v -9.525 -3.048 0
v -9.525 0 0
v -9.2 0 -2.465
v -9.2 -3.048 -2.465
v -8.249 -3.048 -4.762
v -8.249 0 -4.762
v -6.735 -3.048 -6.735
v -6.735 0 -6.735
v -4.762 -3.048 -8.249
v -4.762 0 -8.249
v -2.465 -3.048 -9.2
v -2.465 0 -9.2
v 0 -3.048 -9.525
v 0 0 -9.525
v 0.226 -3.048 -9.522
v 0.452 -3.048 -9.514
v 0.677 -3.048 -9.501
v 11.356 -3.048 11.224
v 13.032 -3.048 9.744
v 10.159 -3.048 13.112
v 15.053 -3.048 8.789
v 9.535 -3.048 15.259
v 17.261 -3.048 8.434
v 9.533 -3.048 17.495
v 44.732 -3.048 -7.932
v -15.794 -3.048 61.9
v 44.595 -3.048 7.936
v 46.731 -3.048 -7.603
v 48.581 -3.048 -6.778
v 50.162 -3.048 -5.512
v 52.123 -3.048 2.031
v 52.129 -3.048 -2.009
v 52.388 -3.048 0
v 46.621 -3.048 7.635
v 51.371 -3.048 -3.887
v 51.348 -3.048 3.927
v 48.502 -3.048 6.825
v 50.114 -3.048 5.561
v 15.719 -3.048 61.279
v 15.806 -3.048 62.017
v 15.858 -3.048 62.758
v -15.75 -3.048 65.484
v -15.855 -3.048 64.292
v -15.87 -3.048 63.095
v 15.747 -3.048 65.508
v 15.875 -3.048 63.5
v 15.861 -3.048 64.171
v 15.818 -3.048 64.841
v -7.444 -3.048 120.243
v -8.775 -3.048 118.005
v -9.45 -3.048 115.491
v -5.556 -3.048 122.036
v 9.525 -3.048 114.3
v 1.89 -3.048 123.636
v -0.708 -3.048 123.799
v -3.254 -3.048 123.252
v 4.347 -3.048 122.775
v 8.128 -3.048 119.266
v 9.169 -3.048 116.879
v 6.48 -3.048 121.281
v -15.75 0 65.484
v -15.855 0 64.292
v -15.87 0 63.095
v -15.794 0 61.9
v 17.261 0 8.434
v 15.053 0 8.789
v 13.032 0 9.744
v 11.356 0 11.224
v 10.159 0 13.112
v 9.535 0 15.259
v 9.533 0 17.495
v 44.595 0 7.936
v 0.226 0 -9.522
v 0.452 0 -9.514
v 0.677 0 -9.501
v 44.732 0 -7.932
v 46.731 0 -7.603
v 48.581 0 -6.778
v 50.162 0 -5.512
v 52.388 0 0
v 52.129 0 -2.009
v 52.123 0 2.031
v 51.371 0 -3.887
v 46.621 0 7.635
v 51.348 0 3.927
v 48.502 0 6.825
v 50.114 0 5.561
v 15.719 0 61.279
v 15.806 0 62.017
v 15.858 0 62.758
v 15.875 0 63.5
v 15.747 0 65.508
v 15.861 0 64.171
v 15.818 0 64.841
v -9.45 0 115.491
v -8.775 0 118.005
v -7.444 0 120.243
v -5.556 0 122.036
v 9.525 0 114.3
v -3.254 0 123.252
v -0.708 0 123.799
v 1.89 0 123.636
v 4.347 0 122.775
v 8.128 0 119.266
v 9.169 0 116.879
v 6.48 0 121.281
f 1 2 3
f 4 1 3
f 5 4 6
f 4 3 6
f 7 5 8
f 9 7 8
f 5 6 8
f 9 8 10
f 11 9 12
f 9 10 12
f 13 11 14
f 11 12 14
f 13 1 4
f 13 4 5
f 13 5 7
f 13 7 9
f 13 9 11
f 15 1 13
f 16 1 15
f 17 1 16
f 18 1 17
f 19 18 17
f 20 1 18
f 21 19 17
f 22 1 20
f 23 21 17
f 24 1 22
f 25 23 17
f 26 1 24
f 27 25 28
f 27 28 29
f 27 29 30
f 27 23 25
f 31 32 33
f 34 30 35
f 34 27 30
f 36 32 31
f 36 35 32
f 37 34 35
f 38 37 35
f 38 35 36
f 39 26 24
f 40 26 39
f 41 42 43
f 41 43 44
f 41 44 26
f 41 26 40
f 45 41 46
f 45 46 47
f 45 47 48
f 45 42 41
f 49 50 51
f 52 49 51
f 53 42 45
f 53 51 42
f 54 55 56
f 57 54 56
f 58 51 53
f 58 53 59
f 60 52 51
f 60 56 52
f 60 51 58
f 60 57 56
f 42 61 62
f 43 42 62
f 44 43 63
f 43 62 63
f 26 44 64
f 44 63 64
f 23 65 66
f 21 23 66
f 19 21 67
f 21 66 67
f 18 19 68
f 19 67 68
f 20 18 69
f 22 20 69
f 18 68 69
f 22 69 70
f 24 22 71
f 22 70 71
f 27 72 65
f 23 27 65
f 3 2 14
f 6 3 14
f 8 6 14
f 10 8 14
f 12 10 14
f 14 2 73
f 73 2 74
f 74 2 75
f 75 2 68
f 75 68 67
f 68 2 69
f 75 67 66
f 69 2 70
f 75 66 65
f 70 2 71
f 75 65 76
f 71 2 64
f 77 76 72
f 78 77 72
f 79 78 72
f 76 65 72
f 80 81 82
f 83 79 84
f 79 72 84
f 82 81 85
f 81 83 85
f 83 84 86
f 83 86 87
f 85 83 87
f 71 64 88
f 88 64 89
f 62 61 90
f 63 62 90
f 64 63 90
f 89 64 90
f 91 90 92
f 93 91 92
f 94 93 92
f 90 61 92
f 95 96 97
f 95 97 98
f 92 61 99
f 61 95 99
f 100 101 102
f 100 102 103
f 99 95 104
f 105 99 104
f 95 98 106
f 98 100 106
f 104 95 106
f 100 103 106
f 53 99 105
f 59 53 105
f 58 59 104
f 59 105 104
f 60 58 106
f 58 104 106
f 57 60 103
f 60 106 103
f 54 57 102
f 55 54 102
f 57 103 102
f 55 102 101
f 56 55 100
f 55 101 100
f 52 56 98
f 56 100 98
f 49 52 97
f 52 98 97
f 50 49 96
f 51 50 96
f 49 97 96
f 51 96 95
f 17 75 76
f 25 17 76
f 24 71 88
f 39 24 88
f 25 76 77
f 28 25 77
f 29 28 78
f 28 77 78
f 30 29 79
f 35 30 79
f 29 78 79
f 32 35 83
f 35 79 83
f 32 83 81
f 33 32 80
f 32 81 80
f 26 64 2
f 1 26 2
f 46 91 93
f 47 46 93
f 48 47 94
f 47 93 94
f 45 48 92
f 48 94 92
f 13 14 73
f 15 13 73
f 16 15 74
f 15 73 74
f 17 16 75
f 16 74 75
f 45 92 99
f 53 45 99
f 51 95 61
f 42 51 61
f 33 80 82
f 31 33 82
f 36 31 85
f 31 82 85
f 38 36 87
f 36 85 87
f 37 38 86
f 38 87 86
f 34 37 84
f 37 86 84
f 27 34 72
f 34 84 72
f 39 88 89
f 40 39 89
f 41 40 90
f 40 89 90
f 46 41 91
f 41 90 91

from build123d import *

# Parameters (mm, degrees)
F0_R     = 3.175
F1_DEPTH = 3.048


with BuildPart() as f1:
    # F0 (on Front) → F1 (new body)
    with BuildSketch(Plane.XZ):
        with BuildLine():
            ThreePointArc((9.525, 114.3), (0.596483242, 123.8063048942), (-9.4502929642, 115.490625))
            ThreePointArc((-9.4502929642, 115.490625), (-7.14375, 107.9998046905), (0, 104.775))
            ThreePointArc((0, 104.775), (6.7351920908, 107.5648079092), (9.525, 114.3))
        make_face()
        with BuildLine():
            ThreePointArc((3.175, 114.3), (2.2450640303, 112.0549359697), (0, 111.125))
            ThreePointArc((0, 111.125), (-2.2450640303, 116.5450640303), (3.175, 114.3))
        make_face(mode=Mode.SUBTRACT)
        with BuildLine():
            Line((0, 47.625), (0, 9.525))
            ThreePointArc((0, 9.525), (6.7351920908, 6.7351920908), (9.525, 0))
            Line((9.525, 0), (36.5125, 0))
            ThreePointArc((36.5125, 0), (38.8886909991, 5.663545572), (44.5945783487, 7.9361831727))
            Line((44.5945783487, 7.9361831727), (17.2606145929, 8.4341428668))
            ThreePointArc((17.2606145929, 8.4341428668), (11.3562252192, 11.224257518), (9.5333913565, 17.4951290964))
            Line((9.5333913565, 17.4951290964), (15.7189155447, 61.2793426425))
            ThreePointArc((15.7189155447, 61.2793426425), (10.4106361345, 51.5152480094), (0, 47.625))
        make_face()
        with BuildLine():
            ThreePointArc((-15.7942028036, 61.9003804205), (-10.644756084, 51.722700101), (0, 47.625))
            Line((0, 47.625), (0, 60.325))
            ThreePointArc((0, 60.325), (-3.175, 63.5), (0, 66.675))
            Line((0, 66.675), (0, 79.375))
            ThreePointArc((0, 79.375), (-10.5003255158, 75.40625), (-15.7504882737, 65.484375))
            ThreePointArc((-15.7504882737, 65.484375), (-15.8738192656, 63.6936154008), (-15.7942028036, 61.9003804205))
        make_face()
        with BuildLine():
            Line((0, 100.0252), (0, 79.375))
            ThreePointArc((0, 79.375), (10.4912828548, 75.4142187767), (15.7474569047, 65.5082893304))
            Line((15.7474569047, 65.5082893304), (9.525, 114.3))
            ThreePointArc((9.525, 114.3), (6.7351920908, 107.5648079092), (0, 104.775))
            Line((0, 104.775), (0, 100.0252))
        make_face()
        with BuildLine():
            ThreePointArc((44.5945783487, 7.9361831727), (38.8886909991, 5.663545572), (36.5125, 0))
            ThreePointArc((36.5125, 0), (38.9380895153, -5.7116327839), (44.7324052746, -7.9324746146))
            ThreePointArc((44.7324052746, -7.9324746146), (50.1616327839, -5.5119104847), (52.3875, 0))
            ThreePointArc((52.3875, 0), (50.113545572, 5.5613090009), (44.5945783487, 7.9361831727))
        make_face()
        with BuildLine():
            ThreePointArc((47.625, 0), (44.45, -3.175), (41.275, 0))
            ThreePointArc((41.275, 0), (44.45, 3.175), (47.625, 0))
        make_face(mode=Mode.SUBTRACT)
        with BuildLine():
            Line((-9.4502929642, 115.490625), (-15.7504882737, 65.484375))
            ThreePointArc((-15.7504882737, 65.484375), (-10.5003255158, 75.40625), (0, 79.375))
            Line((0, 79.375), (0, 100.0252))
            Line((0, 100.0252), (0, 104.775))
            ThreePointArc((0, 104.775), (-7.14375, 107.9998046905), (-9.4502929642, 115.490625))
        make_face()
        with Locations((-3.175, 100.0252)):
            Circle(F0_R, mode=Mode.SUBTRACT)
        with BuildLine():
            Line((0, 60.325), (0, 47.625))
            ThreePointArc((0, 47.625), (10.4106361345, 51.5152480094), (15.7189155447, 61.2793426425))
            ThreePointArc((15.7189155447, 61.2793426425), (15.8359308105, 62.3869320038), (15.875, 63.5))
            ThreePointArc((15.875, 63.5), (15.8430821396, 64.5061676396), (15.7474569047, 65.5082893304))
            ThreePointArc((15.7474569047, 65.5082893304), (10.4912828548, 75.4142187767), (0, 79.375))
            Line((0, 79.375), (0, 66.675))
            ThreePointArc((0, 66.675), (2.2450640303, 65.7450640303), (3.175, 63.5))
            ThreePointArc((3.175, 63.5), (2.2450640303, 61.2549359697), (0, 60.325))
        make_face()
        with BuildLine():
            ThreePointArc((3.175, 0), (-2.2450640303, -2.2450640303), (0, 3.175))
            Line((0, 3.175), (0, 9.525))
            ThreePointArc((0, 9.525), (-6.7351920908, 6.7351920908), (-9.525, 0))
            ThreePointArc((-9.525, 0), (-6.7351920908, -6.7351920908), (0, -9.525))
            Line((0, -9.525), (0.6773435479, -9.500885786))
            ThreePointArc((0.6773435479, -9.500885786), (6.9705567315, -6.4912990883), (9.525, 0))
            Line((9.525, 0), (3.175, 0))
        make_face()
        with BuildLine():
            Line((36.5125, 0), (9.525, 0))
            ThreePointArc((9.525, 0), (6.9705567315, -6.4912990883), (0.6773435479, -9.500885786))
            Line((0.6773435479, -9.500885786), (44.7324052746, -7.9324746146))
            ThreePointArc((44.7324052746, -7.9324746146), (38.9380895153, -5.7116327839), (36.5125, 0))
        make_face()
        with BuildLine():
            ThreePointArc((-9.525, 0), (-6.7351920908, 6.7351920908), (0, 9.525))
            Line((0, 9.525), (0, 47.625))
            ThreePointArc((0, 47.625), (-10.644756084, 51.722700101), (-15.7942028036, 61.9003804205))
            Line((-15.7942028036, 61.9003804205), (-9.525, 0))
        make_face()
        with BuildLine():
            Line((0, 9.525), (0, 3.175))
            ThreePointArc((0, 3.175), (2.2450640303, 2.2450640303), (3.175, 0))
            Line((3.175, 0), (9.525, 0))
            ThreePointArc((9.525, 0), (6.7351920908, 6.7351920908), (0, 9.525))
        make_face()
        with BuildLine():
            ThreePointArc((0, -9.525), (0.3388863295, -9.5189695375), (0.6773435479, -9.500885786))
            Line((0.6773435479, -9.500885786), (0, -9.525))
        make_face()
        with BuildLine():
            ThreePointArc((3.175, 114.3), (-2.2450640303, 116.5450640303), (0, 111.125))
            ThreePointArc((0, 111.125), (2.2450640303, 112.0549359697), (3.175, 114.3))
        make_face()
        with BuildLine():
            ThreePointArc((47.625, 0), (44.45, 3.175), (41.275, 0))
            ThreePointArc((41.275, 0), (44.45, -3.175), (47.625, 0))
        make_face()
        with Locations((-3.175, 100.0252)):
            Circle(F0_R)
        with BuildLine():
            ThreePointArc((0, 66.675), (-3.175, 63.5), (0, 60.325))
            Line((0, 60.325), (0, 63.5))
            Line((0, 63.5), (0, 66.675))
        make_face()
        with BuildLine():
            Line((0, 63.5), (0, 60.325))
            ThreePointArc((0, 60.325), (2.2450640303, 61.2549359697), (3.175, 63.5))
            ThreePointArc((3.175, 63.5), (2.2450640303, 65.7450640303), (0, 66.675))
            Line((0, 66.675), (0, 63.5))
        make_face()
        with BuildLine():
            Line((0, 3.175), (0, 0))
            Line((0, 0), (3.175, 0))
            ThreePointArc((3.175, 0), (2.2450640303, 2.2450640303), (0, 3.175))
        make_face()
        with BuildLine():
            Line((3.175, 0), (0, 0))
            Line((0, 0), (0, 3.175))
            ThreePointArc((0, 3.175), (-2.2450640303, -2.2450640303), (3.175, 0))
        make_face()
    extrude(amount=F1_DEPTH)


solid = f1.part
